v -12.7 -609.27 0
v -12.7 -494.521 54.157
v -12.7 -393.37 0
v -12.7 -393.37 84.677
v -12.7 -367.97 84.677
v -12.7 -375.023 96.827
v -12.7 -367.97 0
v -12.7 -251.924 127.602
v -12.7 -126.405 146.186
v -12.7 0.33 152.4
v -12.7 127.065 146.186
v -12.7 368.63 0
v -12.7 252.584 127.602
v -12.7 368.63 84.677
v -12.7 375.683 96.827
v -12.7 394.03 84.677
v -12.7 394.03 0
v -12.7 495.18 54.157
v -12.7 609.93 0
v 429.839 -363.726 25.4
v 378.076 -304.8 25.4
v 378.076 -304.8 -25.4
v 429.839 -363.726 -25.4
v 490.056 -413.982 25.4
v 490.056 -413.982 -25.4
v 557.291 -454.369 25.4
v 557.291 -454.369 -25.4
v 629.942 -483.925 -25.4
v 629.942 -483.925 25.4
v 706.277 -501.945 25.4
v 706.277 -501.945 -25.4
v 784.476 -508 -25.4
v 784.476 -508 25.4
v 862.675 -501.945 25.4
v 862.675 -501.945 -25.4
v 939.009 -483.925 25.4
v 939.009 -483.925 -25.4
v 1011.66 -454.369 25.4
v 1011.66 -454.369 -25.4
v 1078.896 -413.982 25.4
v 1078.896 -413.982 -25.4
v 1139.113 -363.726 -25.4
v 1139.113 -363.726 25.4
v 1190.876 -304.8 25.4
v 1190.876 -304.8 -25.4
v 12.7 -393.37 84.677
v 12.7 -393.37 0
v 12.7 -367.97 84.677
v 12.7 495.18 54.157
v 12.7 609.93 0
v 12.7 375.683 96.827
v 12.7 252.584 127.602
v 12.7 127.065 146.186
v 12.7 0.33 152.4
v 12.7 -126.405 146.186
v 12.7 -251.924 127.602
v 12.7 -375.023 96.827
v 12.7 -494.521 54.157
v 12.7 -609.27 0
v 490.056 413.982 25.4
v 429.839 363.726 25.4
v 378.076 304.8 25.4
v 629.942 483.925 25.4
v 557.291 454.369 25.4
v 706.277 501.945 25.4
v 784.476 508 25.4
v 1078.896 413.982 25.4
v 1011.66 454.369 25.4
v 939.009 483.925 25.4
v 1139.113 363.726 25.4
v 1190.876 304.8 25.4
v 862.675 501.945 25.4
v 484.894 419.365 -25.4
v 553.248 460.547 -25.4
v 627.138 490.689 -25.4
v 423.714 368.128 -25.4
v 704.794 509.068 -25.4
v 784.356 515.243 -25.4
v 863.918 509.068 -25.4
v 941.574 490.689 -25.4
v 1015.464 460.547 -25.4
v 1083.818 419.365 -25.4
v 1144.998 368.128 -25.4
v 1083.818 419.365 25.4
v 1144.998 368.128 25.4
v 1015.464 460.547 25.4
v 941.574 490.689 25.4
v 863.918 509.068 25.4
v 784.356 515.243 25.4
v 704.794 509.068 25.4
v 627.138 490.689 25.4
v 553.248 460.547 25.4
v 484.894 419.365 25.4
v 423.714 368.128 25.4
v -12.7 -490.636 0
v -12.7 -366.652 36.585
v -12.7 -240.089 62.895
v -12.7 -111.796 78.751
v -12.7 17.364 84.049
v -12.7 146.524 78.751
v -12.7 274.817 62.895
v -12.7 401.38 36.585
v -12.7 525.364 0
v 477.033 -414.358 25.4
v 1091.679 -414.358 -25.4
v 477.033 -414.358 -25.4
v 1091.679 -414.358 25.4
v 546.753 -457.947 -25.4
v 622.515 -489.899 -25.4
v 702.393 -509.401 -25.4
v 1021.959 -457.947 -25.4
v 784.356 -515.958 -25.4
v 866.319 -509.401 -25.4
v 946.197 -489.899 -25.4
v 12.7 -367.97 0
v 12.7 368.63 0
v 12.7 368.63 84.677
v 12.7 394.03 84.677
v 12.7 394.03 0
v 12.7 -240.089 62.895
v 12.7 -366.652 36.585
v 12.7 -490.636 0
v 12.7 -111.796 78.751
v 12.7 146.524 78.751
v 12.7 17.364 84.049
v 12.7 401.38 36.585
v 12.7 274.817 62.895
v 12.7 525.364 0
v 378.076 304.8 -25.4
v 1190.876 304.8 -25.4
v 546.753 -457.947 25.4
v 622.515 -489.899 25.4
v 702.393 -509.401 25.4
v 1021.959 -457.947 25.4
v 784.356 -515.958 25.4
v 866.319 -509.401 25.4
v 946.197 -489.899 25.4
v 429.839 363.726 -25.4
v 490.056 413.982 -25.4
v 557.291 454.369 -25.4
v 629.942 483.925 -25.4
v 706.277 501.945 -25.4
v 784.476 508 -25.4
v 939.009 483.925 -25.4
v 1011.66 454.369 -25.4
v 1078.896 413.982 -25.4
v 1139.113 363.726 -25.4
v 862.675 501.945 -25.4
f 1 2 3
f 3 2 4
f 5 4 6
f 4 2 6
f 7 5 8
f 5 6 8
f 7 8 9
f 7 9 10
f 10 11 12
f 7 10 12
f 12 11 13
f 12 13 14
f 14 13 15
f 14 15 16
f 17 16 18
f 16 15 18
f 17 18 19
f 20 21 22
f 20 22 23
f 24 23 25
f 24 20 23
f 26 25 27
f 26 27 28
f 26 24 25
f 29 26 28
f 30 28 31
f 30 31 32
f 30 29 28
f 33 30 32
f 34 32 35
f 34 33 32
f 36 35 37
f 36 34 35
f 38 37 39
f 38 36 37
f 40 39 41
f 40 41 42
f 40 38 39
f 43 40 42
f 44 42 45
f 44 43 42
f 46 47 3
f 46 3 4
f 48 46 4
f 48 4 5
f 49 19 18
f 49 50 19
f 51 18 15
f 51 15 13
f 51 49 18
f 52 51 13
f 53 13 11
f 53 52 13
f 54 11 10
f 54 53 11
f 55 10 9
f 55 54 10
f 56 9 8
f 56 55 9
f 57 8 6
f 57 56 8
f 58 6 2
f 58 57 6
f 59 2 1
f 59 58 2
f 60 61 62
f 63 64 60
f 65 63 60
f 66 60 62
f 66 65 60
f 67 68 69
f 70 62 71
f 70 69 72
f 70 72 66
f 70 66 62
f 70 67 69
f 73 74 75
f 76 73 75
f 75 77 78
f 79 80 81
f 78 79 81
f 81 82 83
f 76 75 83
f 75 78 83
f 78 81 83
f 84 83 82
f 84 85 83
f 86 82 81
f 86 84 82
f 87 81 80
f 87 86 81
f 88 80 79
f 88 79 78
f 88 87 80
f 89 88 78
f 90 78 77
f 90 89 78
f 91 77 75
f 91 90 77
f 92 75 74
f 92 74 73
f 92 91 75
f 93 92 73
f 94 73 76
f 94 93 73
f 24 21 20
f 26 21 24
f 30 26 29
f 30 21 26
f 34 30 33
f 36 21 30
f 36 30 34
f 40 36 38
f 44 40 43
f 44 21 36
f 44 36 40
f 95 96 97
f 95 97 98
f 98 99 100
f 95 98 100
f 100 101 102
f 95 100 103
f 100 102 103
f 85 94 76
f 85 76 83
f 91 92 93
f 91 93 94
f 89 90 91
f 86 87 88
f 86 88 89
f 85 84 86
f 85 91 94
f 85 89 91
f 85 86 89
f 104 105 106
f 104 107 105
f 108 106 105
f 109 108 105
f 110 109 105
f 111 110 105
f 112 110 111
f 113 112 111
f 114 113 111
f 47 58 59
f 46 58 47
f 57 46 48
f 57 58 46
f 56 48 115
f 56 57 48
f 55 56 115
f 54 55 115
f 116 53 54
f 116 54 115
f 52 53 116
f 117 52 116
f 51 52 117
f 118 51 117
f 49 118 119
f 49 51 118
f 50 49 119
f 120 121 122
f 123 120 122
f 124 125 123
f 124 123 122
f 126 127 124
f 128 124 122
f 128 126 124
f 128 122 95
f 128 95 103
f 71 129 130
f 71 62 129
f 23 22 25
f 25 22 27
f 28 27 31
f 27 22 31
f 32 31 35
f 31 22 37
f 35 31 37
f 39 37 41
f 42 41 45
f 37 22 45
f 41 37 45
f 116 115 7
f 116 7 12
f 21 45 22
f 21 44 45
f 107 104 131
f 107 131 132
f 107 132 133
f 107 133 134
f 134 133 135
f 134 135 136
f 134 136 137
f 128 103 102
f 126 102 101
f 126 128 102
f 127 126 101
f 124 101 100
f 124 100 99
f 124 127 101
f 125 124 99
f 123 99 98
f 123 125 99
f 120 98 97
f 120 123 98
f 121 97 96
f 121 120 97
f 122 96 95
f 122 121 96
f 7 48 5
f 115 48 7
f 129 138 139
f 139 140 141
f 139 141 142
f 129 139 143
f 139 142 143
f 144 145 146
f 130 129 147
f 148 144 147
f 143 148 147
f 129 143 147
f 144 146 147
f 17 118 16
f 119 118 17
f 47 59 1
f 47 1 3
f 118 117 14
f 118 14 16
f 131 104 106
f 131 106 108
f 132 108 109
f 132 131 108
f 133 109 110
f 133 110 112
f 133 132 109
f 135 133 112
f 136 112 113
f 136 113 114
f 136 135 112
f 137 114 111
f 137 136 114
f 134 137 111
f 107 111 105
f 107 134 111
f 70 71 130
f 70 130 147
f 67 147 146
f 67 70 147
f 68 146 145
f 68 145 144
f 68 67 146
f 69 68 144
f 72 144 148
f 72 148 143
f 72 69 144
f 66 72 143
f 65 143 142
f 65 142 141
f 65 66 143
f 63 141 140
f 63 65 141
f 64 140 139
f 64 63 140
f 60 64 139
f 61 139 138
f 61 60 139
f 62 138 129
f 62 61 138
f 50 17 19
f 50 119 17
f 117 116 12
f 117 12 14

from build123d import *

# Parameters (mm, degrees)
F1_DEPTH = 12.7
F3_DEPTH = 12.7
F5_DEPTH = 25.4
F7_DEPTH = 25.4


with BuildPart() as f1:
    # F0 (on Right) → F1 (new body, symmetric)
    with BuildSketch(Plane.YZ):
        with BuildLine():
            ThreePointArc((609.9298857965, 0), (0.3298857965, 152.4), (-609.2701142035, 0))
            Line((-609.2701142035, 0), (-393.3701142035, 0))
            Line((-393.3701142035, 0), (-393.3701142035, 84.6765860915))
            Line((-393.3701142035, 84.6765860915), (-367.9701142035, 84.6765860915))
            Line((-367.9701142035, 84.6765860915), (-367.9701142035, 0))
            Line((-367.9701142035, 0), (368.6298857965, 0))
            Line((368.6298857965, 0), (368.6298857965, 84.6765860915))
            Line((368.6298857965, 84.6765860915), (394.0298857965, 84.6765860915))
            Line((394.0298857965, 84.6765860915), (394.0298857965, 0))
            Line((394.0298857965, 0), (609.9298857965, 0))
        make_face()
    extrude(amount=F1_DEPTH, both=True)


with BuildPart() as f3:
    # F2 (on Right) → F3 (new body, symmetric)
    with BuildSketch(Plane.YZ):
        with BuildLine():
            ThreePointArc((525.3639318908, 0), (17.3639318908, 84.0486), (-490.6360681092, 0))
            Line((-490.6360681092, 0), (525.3639318908, 0))
        make_face()
    extrude(amount=F3_DEPTH, both=True)


with BuildPart() as f5:
    # F4 (on Top) → F5 (new body, symmetric)
    with BuildSketch(Plane.XY):
        with BuildLine():
            Line((378.0756922902, 304.8), (1190.8756922902, 304.8))
            ThreePointArc((1190.8756922902, 304.8), (784.4756922902, 508), (378.0756922902, 304.8))
        make_face()
    extrude(amount=F5_DEPTH, both=True)


with BuildPart() as f5b:
    # F4 (on Top) → F5, piece 2 (new body, symmetric)
    with BuildSketch(Plane.XY):
        with BuildLine():
            Line((1190.8756922902, -304.8), (378.0756922902, -304.8))
            ThreePointArc((378.0756922902, -304.8), (784.4756922902, -508), (1190.8756922902, -304.8))
        make_face()
    extrude(amount=F5_DEPTH, both=True)


with BuildPart() as f7:
    # F6 (on Top) → F7 (new body, symmetric)
    with BuildSketch(Plane.XY):
        with BuildLine():
            Line((1091.6789331235, -414.3576908381), (477.0328999454, -414.3576908381))
            ThreePointArc((477.0328999454, -414.3576908381), (784.3559165345, -515.9576908381), (1091.6789331235, -414.3576908381))
        make_face()
    extrude(amount=F7_DEPTH, both=True)


with BuildPart() as f7b:
    # F6 (on Top) → F7, piece 2 (new body, symmetric)
    with BuildSketch(Plane.XY):
        with BuildLine():
            ThreePointArc((1144.997792211, 368.1276730559), (784.3559165345, 515.2430623647), (423.714040858, 368.1276730559))
            Line((423.714040858, 368.1276730559), (1144.997792211, 368.1276730559))
        make_face()
    extrude(amount=F7_DEPTH, both=True)


solid = Compound([f1.part, f3.part, f5.part, f5b.part, f7.part, f7b.part])
